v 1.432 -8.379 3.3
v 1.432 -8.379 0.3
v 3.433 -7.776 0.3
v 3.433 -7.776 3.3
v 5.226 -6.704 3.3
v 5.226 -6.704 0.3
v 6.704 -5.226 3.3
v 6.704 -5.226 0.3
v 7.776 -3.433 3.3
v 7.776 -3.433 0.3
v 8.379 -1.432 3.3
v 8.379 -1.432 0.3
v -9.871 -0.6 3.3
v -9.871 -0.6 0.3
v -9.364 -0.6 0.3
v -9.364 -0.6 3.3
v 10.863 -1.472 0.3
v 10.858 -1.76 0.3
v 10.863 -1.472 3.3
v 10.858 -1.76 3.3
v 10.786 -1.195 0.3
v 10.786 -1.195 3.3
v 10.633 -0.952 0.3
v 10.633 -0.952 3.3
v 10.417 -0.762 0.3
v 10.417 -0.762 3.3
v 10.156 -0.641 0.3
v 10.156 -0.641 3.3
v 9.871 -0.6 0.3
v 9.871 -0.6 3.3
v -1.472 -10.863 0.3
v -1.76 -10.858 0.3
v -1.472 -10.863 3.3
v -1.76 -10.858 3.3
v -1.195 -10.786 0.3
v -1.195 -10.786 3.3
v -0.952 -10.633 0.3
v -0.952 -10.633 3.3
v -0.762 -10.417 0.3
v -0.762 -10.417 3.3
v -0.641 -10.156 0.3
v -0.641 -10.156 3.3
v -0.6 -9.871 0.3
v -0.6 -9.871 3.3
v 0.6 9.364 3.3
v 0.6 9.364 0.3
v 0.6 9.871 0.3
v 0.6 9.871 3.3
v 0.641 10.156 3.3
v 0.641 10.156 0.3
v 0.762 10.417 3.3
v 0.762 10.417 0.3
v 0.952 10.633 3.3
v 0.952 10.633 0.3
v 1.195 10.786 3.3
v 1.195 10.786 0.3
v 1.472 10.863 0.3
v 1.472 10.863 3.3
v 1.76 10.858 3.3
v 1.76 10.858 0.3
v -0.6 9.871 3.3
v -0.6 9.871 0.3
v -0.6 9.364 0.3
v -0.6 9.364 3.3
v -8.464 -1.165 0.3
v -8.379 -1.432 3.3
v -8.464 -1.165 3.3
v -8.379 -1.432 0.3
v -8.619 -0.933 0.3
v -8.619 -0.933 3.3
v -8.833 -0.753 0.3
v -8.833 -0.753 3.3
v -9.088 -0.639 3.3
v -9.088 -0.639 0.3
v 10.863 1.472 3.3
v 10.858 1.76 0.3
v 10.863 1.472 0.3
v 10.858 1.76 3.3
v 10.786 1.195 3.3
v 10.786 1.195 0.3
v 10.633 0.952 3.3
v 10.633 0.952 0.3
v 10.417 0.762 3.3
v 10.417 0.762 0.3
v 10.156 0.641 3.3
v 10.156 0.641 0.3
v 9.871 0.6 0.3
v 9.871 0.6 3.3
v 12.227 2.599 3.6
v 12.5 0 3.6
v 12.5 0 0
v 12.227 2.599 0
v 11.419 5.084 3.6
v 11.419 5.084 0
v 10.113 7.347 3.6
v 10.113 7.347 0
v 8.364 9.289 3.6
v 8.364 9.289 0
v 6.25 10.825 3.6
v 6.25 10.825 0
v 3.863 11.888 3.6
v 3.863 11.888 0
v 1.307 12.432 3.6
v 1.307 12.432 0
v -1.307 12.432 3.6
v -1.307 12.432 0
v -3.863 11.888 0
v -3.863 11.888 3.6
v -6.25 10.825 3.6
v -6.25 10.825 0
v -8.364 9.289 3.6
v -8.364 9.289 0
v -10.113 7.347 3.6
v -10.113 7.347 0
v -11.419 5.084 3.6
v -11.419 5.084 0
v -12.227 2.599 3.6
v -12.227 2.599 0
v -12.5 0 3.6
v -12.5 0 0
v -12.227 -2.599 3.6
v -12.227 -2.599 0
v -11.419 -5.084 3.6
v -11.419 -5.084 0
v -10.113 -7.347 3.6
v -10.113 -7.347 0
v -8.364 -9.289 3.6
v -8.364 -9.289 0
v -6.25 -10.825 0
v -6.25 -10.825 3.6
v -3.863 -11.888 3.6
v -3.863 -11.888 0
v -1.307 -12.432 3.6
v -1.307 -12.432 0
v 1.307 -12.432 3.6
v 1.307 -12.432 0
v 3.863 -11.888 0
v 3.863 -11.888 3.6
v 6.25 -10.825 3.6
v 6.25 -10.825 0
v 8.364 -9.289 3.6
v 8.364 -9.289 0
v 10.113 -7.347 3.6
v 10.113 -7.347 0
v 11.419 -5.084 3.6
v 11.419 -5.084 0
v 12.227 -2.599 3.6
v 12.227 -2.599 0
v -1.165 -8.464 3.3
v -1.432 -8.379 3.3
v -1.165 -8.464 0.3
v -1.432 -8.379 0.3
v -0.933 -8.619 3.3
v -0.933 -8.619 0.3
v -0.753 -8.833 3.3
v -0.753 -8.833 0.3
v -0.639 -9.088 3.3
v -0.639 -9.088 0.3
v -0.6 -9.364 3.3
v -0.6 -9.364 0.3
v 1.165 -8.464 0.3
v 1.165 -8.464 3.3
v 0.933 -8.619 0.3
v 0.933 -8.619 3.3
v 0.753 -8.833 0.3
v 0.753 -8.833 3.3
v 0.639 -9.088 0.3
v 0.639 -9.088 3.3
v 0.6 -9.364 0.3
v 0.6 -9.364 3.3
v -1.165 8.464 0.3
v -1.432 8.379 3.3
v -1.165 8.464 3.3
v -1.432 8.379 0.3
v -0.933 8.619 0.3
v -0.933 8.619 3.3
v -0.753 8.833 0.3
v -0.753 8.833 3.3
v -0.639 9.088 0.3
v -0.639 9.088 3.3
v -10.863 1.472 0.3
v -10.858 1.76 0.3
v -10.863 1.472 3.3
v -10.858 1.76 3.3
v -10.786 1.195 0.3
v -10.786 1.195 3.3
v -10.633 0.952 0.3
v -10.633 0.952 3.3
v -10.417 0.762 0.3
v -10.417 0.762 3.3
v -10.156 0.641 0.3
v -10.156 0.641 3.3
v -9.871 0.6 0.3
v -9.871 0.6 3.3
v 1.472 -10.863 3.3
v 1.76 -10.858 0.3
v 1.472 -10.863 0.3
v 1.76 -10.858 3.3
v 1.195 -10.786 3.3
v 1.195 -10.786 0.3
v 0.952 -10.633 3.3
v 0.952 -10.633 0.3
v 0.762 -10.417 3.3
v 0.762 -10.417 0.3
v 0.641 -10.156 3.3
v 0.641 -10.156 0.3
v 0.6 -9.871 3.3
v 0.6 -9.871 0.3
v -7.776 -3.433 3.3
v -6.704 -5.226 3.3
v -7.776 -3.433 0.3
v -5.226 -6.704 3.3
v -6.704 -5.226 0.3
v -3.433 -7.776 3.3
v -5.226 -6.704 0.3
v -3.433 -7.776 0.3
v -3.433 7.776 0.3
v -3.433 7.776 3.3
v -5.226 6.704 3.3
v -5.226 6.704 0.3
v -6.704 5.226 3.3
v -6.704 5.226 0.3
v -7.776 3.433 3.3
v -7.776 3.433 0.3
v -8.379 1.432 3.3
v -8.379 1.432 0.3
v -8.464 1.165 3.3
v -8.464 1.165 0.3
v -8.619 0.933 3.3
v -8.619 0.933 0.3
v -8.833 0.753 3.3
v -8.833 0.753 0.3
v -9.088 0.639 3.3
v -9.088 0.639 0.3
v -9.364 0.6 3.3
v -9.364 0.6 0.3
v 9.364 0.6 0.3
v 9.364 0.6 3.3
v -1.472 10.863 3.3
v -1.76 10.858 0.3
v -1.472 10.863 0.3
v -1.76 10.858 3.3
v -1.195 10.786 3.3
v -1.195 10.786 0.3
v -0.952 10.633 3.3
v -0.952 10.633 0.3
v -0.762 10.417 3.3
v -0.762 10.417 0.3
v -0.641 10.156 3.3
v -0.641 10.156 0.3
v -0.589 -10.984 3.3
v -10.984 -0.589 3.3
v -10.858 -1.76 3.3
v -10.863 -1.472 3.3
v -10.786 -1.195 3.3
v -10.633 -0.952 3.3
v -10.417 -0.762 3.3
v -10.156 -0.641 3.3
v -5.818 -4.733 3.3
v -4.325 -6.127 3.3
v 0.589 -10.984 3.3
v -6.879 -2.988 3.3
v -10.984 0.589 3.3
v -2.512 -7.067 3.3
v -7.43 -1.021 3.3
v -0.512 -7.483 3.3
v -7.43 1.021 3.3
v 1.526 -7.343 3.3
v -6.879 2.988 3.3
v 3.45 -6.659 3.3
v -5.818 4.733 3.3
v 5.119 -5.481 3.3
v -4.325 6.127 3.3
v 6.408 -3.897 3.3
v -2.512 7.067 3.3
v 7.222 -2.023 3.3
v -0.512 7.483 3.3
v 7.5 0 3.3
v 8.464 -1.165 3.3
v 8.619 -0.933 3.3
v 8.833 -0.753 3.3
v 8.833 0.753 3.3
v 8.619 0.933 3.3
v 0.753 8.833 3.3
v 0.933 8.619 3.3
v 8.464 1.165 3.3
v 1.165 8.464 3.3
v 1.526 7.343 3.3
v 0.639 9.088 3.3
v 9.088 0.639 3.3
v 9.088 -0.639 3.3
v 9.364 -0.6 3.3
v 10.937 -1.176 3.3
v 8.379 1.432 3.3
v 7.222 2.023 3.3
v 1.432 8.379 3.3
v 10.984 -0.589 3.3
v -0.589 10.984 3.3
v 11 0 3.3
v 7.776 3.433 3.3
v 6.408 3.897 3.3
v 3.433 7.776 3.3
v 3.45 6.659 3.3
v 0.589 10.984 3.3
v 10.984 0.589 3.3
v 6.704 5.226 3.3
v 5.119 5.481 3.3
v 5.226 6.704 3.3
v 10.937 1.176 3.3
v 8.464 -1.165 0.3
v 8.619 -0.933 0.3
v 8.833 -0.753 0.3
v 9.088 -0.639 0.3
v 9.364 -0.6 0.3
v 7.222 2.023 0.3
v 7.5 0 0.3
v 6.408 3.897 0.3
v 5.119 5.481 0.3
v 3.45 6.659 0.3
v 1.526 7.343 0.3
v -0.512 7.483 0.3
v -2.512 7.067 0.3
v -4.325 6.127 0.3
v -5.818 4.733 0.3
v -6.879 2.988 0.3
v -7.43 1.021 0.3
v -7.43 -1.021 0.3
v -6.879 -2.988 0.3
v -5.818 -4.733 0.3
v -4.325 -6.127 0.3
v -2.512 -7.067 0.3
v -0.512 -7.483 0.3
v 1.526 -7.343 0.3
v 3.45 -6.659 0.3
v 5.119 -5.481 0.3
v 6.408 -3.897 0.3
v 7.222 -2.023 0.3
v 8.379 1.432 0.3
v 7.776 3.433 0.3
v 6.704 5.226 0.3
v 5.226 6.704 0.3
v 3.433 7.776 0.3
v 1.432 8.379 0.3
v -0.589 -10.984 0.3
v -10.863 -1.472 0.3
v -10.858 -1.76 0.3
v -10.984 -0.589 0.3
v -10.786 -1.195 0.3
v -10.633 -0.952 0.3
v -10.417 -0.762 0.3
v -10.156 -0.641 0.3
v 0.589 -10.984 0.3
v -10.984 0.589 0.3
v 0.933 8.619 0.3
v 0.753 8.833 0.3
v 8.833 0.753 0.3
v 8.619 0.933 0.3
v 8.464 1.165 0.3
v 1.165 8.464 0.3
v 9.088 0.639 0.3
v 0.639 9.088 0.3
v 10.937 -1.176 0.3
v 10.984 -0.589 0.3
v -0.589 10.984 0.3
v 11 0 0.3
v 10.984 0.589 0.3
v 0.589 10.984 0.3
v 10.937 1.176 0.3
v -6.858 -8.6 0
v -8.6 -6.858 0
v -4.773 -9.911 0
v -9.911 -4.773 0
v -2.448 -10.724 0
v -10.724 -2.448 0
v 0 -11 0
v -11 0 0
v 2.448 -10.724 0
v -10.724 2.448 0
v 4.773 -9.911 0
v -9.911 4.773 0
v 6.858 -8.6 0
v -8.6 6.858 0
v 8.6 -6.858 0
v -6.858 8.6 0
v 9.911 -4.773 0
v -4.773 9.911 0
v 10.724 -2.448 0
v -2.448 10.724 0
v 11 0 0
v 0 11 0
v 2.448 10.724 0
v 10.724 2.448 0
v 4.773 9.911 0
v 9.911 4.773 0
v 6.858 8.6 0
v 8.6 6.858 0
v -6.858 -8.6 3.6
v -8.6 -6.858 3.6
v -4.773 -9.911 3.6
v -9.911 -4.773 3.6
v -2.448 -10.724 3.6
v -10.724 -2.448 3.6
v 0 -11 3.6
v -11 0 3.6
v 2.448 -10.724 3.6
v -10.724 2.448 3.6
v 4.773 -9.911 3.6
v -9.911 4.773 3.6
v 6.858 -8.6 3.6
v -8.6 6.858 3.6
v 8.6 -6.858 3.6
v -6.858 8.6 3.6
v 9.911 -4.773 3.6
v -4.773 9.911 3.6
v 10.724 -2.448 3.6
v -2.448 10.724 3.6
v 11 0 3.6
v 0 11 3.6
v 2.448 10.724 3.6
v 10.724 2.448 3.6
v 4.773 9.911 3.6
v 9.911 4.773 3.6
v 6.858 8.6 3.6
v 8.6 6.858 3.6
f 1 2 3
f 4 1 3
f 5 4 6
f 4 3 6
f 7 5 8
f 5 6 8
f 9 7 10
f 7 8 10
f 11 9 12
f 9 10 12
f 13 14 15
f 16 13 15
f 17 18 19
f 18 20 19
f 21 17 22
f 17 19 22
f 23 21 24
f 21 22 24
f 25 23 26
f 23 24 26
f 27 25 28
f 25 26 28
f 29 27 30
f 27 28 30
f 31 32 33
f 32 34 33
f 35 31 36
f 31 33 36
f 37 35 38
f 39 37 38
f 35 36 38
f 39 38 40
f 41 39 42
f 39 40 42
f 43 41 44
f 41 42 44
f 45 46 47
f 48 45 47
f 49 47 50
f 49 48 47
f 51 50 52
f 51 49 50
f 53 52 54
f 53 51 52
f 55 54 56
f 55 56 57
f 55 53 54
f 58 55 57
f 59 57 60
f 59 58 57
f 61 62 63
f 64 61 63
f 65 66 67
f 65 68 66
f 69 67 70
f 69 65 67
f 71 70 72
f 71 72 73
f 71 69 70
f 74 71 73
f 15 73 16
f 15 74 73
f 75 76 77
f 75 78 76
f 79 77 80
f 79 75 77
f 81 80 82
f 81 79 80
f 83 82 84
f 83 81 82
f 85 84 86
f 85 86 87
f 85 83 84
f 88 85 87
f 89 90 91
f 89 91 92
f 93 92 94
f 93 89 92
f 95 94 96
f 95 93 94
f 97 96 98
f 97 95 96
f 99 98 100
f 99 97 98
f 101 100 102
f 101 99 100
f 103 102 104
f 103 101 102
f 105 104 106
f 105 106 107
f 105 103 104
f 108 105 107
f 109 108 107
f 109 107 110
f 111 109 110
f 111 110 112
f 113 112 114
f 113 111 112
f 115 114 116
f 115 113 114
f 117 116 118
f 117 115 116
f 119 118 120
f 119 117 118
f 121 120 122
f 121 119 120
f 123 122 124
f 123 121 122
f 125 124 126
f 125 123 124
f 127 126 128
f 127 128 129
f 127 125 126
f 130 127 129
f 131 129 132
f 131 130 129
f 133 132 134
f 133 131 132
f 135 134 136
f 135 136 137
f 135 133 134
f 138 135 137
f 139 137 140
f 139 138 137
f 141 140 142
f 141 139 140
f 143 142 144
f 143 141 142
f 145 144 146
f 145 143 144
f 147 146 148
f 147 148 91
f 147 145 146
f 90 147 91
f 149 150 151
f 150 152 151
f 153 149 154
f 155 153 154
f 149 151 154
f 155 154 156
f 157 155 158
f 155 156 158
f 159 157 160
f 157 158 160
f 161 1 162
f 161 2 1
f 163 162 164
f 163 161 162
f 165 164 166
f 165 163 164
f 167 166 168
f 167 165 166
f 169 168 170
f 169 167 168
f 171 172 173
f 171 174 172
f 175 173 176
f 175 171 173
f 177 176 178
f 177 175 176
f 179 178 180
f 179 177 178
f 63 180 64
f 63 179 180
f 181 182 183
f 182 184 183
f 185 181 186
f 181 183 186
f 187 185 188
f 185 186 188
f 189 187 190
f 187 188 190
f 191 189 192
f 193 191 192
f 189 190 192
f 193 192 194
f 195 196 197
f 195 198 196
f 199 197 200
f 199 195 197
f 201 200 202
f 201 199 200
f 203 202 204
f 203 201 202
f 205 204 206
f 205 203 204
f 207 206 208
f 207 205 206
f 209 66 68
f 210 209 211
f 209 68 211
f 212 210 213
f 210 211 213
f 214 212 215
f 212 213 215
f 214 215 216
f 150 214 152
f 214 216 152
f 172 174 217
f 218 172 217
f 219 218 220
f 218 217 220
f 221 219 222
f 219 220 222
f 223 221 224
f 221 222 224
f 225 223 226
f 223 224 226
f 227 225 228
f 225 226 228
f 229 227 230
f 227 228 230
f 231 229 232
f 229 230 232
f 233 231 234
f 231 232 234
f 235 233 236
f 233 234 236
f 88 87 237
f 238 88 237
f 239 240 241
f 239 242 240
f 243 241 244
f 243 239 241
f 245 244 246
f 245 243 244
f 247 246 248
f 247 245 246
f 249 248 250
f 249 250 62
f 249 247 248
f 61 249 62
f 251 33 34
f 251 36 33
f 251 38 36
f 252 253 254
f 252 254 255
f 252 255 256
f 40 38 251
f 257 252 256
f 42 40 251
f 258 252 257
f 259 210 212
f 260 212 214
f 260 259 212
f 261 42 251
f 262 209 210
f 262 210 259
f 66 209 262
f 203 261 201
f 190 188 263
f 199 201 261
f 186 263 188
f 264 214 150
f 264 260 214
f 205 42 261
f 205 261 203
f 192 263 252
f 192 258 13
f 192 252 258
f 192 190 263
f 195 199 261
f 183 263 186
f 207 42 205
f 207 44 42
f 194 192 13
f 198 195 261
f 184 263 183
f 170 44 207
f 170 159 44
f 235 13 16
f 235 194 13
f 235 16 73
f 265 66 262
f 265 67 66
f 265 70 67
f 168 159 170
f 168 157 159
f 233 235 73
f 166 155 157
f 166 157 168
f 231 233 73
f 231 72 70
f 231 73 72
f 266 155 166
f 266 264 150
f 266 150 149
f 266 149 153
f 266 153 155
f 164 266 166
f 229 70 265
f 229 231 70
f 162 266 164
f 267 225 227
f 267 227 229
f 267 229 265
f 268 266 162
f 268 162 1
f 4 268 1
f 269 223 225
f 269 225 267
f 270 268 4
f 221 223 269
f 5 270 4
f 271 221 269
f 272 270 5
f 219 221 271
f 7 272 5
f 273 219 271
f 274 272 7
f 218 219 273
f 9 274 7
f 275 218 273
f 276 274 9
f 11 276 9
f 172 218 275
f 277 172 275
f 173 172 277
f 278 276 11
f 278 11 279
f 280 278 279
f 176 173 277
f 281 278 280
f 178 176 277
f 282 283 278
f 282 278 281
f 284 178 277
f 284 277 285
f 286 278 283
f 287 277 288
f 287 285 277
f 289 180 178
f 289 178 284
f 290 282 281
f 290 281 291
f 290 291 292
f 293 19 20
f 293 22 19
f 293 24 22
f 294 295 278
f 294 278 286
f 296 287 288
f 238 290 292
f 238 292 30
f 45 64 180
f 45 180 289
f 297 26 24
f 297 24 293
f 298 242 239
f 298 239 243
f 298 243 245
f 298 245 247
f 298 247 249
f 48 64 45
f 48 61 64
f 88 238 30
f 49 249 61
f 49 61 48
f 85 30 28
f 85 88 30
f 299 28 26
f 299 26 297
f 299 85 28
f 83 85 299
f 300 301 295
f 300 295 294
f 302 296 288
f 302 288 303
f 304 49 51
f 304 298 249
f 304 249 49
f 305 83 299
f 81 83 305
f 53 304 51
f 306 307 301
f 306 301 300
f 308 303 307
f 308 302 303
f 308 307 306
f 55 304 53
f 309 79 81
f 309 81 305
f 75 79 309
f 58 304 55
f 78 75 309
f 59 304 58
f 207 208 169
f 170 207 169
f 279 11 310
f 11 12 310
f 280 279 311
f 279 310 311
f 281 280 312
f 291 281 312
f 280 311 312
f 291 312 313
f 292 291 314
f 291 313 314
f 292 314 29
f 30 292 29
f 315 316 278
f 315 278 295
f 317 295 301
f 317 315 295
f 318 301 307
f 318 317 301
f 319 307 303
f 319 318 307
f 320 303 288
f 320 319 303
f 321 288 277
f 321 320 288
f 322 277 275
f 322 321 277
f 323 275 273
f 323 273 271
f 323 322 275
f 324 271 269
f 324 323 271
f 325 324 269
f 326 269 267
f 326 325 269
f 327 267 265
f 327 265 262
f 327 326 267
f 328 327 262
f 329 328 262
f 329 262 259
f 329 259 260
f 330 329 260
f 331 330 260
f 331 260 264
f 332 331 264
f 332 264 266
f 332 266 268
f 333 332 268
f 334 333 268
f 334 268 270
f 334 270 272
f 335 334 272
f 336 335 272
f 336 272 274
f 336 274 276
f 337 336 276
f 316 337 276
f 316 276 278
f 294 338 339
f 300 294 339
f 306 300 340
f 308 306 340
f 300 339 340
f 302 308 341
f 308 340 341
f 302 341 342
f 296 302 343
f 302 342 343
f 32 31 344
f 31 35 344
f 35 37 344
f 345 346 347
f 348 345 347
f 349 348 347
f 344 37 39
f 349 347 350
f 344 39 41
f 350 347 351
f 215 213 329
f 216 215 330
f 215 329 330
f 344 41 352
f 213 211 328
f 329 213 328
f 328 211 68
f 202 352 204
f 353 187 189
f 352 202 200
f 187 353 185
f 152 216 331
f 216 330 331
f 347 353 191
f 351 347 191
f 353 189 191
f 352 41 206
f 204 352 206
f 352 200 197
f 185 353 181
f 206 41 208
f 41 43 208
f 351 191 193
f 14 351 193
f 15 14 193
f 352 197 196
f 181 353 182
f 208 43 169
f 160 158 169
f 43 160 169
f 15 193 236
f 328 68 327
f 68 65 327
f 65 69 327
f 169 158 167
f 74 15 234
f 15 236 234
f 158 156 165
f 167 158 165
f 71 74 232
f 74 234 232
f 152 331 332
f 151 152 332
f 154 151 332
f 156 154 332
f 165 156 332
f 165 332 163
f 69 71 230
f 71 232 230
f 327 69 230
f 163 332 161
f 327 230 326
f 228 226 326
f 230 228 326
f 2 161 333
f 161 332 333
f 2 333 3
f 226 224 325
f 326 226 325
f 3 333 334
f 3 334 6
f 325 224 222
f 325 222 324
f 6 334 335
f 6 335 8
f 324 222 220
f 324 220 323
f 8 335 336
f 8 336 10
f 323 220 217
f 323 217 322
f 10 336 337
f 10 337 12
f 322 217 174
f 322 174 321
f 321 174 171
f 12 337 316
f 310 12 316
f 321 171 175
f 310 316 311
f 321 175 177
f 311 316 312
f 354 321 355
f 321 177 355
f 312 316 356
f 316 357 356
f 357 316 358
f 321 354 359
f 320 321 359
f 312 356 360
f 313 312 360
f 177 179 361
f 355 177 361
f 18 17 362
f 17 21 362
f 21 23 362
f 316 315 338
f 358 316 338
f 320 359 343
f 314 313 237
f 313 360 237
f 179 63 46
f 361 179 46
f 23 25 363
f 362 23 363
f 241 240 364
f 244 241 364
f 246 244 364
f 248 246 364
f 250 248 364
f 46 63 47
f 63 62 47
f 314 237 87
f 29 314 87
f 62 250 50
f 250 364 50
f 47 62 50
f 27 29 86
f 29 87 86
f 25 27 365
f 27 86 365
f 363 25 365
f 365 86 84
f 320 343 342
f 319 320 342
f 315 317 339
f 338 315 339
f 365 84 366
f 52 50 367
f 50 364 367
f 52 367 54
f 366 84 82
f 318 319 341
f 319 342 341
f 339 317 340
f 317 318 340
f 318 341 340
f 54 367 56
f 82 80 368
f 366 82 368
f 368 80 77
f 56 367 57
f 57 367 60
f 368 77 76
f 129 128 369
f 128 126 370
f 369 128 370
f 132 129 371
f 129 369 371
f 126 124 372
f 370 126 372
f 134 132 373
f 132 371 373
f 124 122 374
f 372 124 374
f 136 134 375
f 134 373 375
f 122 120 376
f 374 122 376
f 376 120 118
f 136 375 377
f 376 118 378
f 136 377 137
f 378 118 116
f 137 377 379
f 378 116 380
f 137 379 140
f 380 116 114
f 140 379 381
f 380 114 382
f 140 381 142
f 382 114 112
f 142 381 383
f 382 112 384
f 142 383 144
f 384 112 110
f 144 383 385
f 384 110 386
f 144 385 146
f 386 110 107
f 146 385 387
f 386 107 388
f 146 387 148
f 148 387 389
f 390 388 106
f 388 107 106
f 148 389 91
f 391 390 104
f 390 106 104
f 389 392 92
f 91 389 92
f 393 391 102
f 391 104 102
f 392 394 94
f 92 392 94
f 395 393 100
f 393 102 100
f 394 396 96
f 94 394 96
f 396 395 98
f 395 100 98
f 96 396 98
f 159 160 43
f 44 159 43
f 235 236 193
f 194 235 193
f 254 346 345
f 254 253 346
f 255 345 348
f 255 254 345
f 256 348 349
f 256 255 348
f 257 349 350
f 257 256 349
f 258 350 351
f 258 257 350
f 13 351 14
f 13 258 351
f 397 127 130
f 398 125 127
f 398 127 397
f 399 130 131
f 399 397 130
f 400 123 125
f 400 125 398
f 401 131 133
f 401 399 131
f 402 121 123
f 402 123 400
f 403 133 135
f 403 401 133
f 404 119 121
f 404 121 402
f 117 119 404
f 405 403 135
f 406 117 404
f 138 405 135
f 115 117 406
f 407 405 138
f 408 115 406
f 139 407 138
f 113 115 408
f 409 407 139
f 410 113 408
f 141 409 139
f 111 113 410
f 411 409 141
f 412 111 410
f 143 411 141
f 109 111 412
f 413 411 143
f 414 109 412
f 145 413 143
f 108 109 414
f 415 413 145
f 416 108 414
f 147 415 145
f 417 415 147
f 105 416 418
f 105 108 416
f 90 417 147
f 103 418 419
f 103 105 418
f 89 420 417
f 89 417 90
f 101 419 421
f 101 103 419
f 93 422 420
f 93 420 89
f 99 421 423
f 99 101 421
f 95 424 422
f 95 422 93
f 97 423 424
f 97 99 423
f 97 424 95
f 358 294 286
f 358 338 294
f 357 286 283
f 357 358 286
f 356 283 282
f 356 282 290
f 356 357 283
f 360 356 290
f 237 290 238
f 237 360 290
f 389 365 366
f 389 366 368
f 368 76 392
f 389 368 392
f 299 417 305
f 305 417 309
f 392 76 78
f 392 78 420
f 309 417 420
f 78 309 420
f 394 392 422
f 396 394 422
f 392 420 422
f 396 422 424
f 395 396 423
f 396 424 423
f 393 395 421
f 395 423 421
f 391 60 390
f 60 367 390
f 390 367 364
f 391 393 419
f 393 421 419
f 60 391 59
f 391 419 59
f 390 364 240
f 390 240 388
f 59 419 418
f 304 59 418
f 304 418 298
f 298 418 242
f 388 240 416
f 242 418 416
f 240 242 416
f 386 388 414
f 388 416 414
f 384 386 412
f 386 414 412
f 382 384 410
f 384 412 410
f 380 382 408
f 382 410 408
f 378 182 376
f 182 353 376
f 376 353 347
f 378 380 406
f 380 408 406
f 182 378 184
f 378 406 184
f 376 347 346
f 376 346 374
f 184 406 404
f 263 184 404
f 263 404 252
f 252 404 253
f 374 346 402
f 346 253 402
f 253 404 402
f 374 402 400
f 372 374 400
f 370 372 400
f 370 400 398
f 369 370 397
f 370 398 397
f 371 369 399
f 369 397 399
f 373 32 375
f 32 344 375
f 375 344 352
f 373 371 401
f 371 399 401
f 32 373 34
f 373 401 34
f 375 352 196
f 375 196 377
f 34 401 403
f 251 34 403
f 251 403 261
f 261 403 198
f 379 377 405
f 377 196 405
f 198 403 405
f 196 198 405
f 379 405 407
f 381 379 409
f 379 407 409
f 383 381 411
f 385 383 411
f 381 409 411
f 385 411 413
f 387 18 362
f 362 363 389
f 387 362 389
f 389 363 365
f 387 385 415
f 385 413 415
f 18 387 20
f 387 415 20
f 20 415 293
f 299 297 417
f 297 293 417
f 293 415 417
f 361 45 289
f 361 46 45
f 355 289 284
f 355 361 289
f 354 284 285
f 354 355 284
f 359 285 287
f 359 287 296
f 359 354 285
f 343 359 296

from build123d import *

# Parameters (mm, degrees)
SKETCH_1_R          = 8.5
SKETCH_1_R_2        = 7.5
EXTRUDE_1_DEPTH     = 3.6
SKETCH_2_R          = 12.5
SKETCH_2_R_2        = 11
EXTRUDE_2_DEPTH     = 3.6
EXTRUDE_START       = -3
EXTRUDE_3_DEPTH     = 3
FILLET_1_R          = 1
CUT_EXTRUDE_START   = -0.3
SKETCH_5_R          = 8.5
SKETCH_5_R_2        = 7.5
CUT_EXTRUDE_1_DEPTH = 0.3
SKETCH_6_R          = 8.5
SKETCH_6_R_2        = 7.5
CUT_EXTRUDE_2_DEPTH = 0.3


with BuildPart() as part:
    # 草图1 → 凸台-拉伸1 (new body)
    with BuildSketch(Plane.XY):
        Circle(SKETCH_1_R)
        Circle(SKETCH_1_R_2, mode=Mode.SUBTRACT)
    extrude(amount=EXTRUDE_1_DEPTH)



with BuildPart() as body_2:
    # 草图2 → 凸台-拉伸2 (new body)
    with BuildSketch(Plane.XY.offset(3.6)):
        Circle(SKETCH_2_R)
        Circle(SKETCH_2_R_2, mode=Mode.SUBTRACT)
    extrude(amount=-EXTRUDE_2_DEPTH)


with BuildPart() as part_1:
    add(part.part)

    add(body_2.part)  # 凸台-拉伸3 merges body 2
    # 草图4 → 凸台-拉伸3 (add)
    with BuildSketch(Plane.XY.offset(3.3).offset(EXTRUDE_START)):
        with BuildLine():
            ThreePointArc((-0.6, 8.478797084), (0, 8.5), (0.6, 8.478797084))
            Line((0.6, 8.478797084), (0.6, 10.983624174))
            ThreePointArc((0.6, 10.983624174), (0, 11), (-0.6, 10.983624174))
            Line((-0.6, 10.983624174), (-0.6, 8.478797084))
        make_face()
        with BuildLine():
            Line((-11, 0), (-8.5, 0))
            ThreePointArc((-8.5, 0), (-8.494697617, 0.30018726), (-8.478797084, 0.6))
            Line((-8.478797084, 0.6), (-10.983624174, 0.6))
            ThreePointArc((-10.983624174, 0.6), (-10.995905281, 0.300111716), (-11, 0))
        make_face()
        with BuildLine():
            Line((0.6, -10.983624174), (0.6, -8.478797084))
            ThreePointArc((0.6, -8.478797084), (0, -8.5), (-0.6, -8.478797084))
            Line((-0.6, -8.478797084), (-0.6, -10.983624174))
            ThreePointArc((-0.6, -10.983624174), (0, -11), (0.6, -10.983624174))
        make_face()
        with BuildLine():
            ThreePointArc((8.478797084, 0.6), (8.494697617, 0.30018726), (8.5, 0))
            Line((8.5, 0), (11, 0))
            ThreePointArc((11, 0), (10.995905281, 0.300111716), (10.983624174, 0.6))
            Line((10.983624174, 0.6), (8.478797084, 0.6))
        make_face()
        with BuildLine():
            Line((8, 0), (8.5, 0))
            ThreePointArc((8.5, 0), (8.494697617, 0.30018726), (8.478797084, 0.6))
            Line((8.478797084, 0.6), (8, 0.6))
            Line((8, 0.6), (8, 0))
        make_face()
        with BuildLine():
            ThreePointArc((10.983624174, 0.6), (10.995905281, 0.300111716), (11, 0))
            ThreePointArc((11, 0), (10.995905281, -0.300111716), (10.983624174, -0.6))
            Line((10.983624174, -0.6), (11.5, -0.6))
            Line((11.5, -0.6), (11.5, 0.6))
            Line((11.5, 0.6), (10.983624174, 0.6))
        make_face()
        with BuildLine():
            Line((11, 0), (8.5, 0))
            ThreePointArc((8.5, 0), (8.494697617, -0.30018726), (8.478797084, -0.6))
            Line((8.478797084, -0.6), (10.983624174, -0.6))
            ThreePointArc((10.983624174, -0.6), (10.995905281, -0.300111716), (11, 0))
        make_face()
        with BuildLine():
            ThreePointArc((8.478797084, -0.6), (8.494697617, -0.30018726), (8.5, 0))
            Line((8.5, 0), (8, 0))
            Line((8, 0), (8, -0.6))
            Line((8, -0.6), (8.478797084, -0.6))
        make_face()
        with BuildLine():
            Line((0.6, -11.5), (0.6, -10.983624174))
            ThreePointArc((0.6, -10.983624174), (0, -11), (-0.6, -10.983624174))
            Line((-0.6, -10.983624174), (-0.6, -11.5))
            Line((-0.6, -11.5), (0.6, -11.5))
        make_face()
        with BuildLine():
            ThreePointArc((-0.6, -8.478797084), (0, -8.5), (0.6, -8.478797084))
            Line((0.6, -8.478797084), (0.6, -8))
            Line((0.6, -8), (-0.6, -8))
            Line((-0.6, -8), (-0.6, -8.478797084))
        make_face()
        with BuildLine():
            ThreePointArc((-10.983624174, -0.6), (-10.995905281, -0.300111716), (-11, 0))
            ThreePointArc((-11, 0), (-10.995905281, 0.300111716), (-10.983624174, 0.6))
            Line((-10.983624174, 0.6), (-11.5, 0.6))
            Line((-11.5, 0.6), (-11.5, -0.6))
            Line((-11.5, -0.6), (-10.983624174, -0.6))
        make_face()
        with BuildLine():
            ThreePointArc((-8.478797084, -0.6), (-8.494697617, -0.30018726), (-8.5, 0))
            Line((-8.5, 0), (-11, 0))
            ThreePointArc((-11, 0), (-10.995905281, -0.300111716), (-10.983624174, -0.6))
            Line((-10.983624174, -0.6), (-8.478797084, -0.6))
        make_face()
        with BuildLine():
            Line((-8, -0.6), (-8, 0))
            Line((-8, 0), (-8.5, 0))
            ThreePointArc((-8.5, 0), (-8.494697617, -0.30018726), (-8.478797084, -0.6))
            Line((-8.478797084, -0.6), (-8, -0.6))
        make_face()
        with BuildLine():
            Line((-8.5, 0), (-8, 0))
            Line((-8, 0), (-8, 0.6))
            Line((-8, 0.6), (-8.478797084, 0.6))
            ThreePointArc((-8.478797084, 0.6), (-8.494697617, 0.30018726), (-8.5, 0))
        make_face()
        with BuildLine():
            ThreePointArc((-0.6, 10.983624174), (0, 11), (0.6, 10.983624174))
            Line((0.6, 10.983624174), (0.6, 11.5))
            Line((0.6, 11.5), (-0.6, 11.5))
            Line((-0.6, 11.5), (-0.6, 10.983624174))
        make_face()
        with BuildLine():
            Line((0.6, 8), (0.6, 8.478797084))
            ThreePointArc((0.6, 8.478797084), (0, 8.5), (-0.6, 8.478797084))
            Line((-0.6, 8.478797084), (-0.6, 8))
            Line((-0.6, 8), (0.6, 8))
        make_face()
    extrude(amount=EXTRUDE_3_DEPTH)

    # 圆角1
    fillet_1_edges = [part_1.edges().sort_by_distance(p)[0] for p in [
        (0.6, 10.983624174, 1.8),
        (0.6, 8.478797084, 1.8),
        (-0.6, 8.478797084, 1.8),
        (8.478797084, -0.6, 1.8),
        (8.478797084, 0.6, 1.8),
        (10.983624174, 0.6, 1.8),
        (10.983624174, -0.6, 1.8),
        (0.6, -10.983624174, 1.8),
        (-0.6, -10.983624174, 1.8),
        (-0.6, -8.478797084, 1.8),
        (0.6, -8.478797084, 1.8),
        (-10.983624174, -0.6, 1.8),
        (-10.983624174, 0.6, 1.8),
        (-8.478797084, 0.6, 1.8),
        (-8.478797084, -0.6, 1.8),
        (-0.6, 10.983624174, 1.8),
    ]]
    fillet(fillet_1_edges, radius=FILLET_1_R)

    # 草图5 → 切除-拉伸1 (cut)
    with BuildSketch(Plane.XY.offset(3.6).offset(CUT_EXTRUDE_START)):
        with Locations(Location((0, 0, 0), (0, 0, 170.303971602))):
            Circle(SKETCH_5_R)
        Circle(SKETCH_5_R_2, mode=Mode.SUBTRACT)
    extrude(amount=CUT_EXTRUDE_1_DEPTH, mode=Mode.SUBTRACT)

    # 草图6 → 切除-拉伸2 (cut)
    with BuildSketch(Plane(origin=(0, 0, 0), x_dir=(-1, 0, 0), z_dir=(0, 0, -1))):
        Circle(SKETCH_6_R)
        Circle(SKETCH_6_R_2, mode=Mode.SUBTRACT)
    extrude(amount=-CUT_EXTRUDE_2_DEPTH, mode=Mode.SUBTRACT)


solid = part_1.part
